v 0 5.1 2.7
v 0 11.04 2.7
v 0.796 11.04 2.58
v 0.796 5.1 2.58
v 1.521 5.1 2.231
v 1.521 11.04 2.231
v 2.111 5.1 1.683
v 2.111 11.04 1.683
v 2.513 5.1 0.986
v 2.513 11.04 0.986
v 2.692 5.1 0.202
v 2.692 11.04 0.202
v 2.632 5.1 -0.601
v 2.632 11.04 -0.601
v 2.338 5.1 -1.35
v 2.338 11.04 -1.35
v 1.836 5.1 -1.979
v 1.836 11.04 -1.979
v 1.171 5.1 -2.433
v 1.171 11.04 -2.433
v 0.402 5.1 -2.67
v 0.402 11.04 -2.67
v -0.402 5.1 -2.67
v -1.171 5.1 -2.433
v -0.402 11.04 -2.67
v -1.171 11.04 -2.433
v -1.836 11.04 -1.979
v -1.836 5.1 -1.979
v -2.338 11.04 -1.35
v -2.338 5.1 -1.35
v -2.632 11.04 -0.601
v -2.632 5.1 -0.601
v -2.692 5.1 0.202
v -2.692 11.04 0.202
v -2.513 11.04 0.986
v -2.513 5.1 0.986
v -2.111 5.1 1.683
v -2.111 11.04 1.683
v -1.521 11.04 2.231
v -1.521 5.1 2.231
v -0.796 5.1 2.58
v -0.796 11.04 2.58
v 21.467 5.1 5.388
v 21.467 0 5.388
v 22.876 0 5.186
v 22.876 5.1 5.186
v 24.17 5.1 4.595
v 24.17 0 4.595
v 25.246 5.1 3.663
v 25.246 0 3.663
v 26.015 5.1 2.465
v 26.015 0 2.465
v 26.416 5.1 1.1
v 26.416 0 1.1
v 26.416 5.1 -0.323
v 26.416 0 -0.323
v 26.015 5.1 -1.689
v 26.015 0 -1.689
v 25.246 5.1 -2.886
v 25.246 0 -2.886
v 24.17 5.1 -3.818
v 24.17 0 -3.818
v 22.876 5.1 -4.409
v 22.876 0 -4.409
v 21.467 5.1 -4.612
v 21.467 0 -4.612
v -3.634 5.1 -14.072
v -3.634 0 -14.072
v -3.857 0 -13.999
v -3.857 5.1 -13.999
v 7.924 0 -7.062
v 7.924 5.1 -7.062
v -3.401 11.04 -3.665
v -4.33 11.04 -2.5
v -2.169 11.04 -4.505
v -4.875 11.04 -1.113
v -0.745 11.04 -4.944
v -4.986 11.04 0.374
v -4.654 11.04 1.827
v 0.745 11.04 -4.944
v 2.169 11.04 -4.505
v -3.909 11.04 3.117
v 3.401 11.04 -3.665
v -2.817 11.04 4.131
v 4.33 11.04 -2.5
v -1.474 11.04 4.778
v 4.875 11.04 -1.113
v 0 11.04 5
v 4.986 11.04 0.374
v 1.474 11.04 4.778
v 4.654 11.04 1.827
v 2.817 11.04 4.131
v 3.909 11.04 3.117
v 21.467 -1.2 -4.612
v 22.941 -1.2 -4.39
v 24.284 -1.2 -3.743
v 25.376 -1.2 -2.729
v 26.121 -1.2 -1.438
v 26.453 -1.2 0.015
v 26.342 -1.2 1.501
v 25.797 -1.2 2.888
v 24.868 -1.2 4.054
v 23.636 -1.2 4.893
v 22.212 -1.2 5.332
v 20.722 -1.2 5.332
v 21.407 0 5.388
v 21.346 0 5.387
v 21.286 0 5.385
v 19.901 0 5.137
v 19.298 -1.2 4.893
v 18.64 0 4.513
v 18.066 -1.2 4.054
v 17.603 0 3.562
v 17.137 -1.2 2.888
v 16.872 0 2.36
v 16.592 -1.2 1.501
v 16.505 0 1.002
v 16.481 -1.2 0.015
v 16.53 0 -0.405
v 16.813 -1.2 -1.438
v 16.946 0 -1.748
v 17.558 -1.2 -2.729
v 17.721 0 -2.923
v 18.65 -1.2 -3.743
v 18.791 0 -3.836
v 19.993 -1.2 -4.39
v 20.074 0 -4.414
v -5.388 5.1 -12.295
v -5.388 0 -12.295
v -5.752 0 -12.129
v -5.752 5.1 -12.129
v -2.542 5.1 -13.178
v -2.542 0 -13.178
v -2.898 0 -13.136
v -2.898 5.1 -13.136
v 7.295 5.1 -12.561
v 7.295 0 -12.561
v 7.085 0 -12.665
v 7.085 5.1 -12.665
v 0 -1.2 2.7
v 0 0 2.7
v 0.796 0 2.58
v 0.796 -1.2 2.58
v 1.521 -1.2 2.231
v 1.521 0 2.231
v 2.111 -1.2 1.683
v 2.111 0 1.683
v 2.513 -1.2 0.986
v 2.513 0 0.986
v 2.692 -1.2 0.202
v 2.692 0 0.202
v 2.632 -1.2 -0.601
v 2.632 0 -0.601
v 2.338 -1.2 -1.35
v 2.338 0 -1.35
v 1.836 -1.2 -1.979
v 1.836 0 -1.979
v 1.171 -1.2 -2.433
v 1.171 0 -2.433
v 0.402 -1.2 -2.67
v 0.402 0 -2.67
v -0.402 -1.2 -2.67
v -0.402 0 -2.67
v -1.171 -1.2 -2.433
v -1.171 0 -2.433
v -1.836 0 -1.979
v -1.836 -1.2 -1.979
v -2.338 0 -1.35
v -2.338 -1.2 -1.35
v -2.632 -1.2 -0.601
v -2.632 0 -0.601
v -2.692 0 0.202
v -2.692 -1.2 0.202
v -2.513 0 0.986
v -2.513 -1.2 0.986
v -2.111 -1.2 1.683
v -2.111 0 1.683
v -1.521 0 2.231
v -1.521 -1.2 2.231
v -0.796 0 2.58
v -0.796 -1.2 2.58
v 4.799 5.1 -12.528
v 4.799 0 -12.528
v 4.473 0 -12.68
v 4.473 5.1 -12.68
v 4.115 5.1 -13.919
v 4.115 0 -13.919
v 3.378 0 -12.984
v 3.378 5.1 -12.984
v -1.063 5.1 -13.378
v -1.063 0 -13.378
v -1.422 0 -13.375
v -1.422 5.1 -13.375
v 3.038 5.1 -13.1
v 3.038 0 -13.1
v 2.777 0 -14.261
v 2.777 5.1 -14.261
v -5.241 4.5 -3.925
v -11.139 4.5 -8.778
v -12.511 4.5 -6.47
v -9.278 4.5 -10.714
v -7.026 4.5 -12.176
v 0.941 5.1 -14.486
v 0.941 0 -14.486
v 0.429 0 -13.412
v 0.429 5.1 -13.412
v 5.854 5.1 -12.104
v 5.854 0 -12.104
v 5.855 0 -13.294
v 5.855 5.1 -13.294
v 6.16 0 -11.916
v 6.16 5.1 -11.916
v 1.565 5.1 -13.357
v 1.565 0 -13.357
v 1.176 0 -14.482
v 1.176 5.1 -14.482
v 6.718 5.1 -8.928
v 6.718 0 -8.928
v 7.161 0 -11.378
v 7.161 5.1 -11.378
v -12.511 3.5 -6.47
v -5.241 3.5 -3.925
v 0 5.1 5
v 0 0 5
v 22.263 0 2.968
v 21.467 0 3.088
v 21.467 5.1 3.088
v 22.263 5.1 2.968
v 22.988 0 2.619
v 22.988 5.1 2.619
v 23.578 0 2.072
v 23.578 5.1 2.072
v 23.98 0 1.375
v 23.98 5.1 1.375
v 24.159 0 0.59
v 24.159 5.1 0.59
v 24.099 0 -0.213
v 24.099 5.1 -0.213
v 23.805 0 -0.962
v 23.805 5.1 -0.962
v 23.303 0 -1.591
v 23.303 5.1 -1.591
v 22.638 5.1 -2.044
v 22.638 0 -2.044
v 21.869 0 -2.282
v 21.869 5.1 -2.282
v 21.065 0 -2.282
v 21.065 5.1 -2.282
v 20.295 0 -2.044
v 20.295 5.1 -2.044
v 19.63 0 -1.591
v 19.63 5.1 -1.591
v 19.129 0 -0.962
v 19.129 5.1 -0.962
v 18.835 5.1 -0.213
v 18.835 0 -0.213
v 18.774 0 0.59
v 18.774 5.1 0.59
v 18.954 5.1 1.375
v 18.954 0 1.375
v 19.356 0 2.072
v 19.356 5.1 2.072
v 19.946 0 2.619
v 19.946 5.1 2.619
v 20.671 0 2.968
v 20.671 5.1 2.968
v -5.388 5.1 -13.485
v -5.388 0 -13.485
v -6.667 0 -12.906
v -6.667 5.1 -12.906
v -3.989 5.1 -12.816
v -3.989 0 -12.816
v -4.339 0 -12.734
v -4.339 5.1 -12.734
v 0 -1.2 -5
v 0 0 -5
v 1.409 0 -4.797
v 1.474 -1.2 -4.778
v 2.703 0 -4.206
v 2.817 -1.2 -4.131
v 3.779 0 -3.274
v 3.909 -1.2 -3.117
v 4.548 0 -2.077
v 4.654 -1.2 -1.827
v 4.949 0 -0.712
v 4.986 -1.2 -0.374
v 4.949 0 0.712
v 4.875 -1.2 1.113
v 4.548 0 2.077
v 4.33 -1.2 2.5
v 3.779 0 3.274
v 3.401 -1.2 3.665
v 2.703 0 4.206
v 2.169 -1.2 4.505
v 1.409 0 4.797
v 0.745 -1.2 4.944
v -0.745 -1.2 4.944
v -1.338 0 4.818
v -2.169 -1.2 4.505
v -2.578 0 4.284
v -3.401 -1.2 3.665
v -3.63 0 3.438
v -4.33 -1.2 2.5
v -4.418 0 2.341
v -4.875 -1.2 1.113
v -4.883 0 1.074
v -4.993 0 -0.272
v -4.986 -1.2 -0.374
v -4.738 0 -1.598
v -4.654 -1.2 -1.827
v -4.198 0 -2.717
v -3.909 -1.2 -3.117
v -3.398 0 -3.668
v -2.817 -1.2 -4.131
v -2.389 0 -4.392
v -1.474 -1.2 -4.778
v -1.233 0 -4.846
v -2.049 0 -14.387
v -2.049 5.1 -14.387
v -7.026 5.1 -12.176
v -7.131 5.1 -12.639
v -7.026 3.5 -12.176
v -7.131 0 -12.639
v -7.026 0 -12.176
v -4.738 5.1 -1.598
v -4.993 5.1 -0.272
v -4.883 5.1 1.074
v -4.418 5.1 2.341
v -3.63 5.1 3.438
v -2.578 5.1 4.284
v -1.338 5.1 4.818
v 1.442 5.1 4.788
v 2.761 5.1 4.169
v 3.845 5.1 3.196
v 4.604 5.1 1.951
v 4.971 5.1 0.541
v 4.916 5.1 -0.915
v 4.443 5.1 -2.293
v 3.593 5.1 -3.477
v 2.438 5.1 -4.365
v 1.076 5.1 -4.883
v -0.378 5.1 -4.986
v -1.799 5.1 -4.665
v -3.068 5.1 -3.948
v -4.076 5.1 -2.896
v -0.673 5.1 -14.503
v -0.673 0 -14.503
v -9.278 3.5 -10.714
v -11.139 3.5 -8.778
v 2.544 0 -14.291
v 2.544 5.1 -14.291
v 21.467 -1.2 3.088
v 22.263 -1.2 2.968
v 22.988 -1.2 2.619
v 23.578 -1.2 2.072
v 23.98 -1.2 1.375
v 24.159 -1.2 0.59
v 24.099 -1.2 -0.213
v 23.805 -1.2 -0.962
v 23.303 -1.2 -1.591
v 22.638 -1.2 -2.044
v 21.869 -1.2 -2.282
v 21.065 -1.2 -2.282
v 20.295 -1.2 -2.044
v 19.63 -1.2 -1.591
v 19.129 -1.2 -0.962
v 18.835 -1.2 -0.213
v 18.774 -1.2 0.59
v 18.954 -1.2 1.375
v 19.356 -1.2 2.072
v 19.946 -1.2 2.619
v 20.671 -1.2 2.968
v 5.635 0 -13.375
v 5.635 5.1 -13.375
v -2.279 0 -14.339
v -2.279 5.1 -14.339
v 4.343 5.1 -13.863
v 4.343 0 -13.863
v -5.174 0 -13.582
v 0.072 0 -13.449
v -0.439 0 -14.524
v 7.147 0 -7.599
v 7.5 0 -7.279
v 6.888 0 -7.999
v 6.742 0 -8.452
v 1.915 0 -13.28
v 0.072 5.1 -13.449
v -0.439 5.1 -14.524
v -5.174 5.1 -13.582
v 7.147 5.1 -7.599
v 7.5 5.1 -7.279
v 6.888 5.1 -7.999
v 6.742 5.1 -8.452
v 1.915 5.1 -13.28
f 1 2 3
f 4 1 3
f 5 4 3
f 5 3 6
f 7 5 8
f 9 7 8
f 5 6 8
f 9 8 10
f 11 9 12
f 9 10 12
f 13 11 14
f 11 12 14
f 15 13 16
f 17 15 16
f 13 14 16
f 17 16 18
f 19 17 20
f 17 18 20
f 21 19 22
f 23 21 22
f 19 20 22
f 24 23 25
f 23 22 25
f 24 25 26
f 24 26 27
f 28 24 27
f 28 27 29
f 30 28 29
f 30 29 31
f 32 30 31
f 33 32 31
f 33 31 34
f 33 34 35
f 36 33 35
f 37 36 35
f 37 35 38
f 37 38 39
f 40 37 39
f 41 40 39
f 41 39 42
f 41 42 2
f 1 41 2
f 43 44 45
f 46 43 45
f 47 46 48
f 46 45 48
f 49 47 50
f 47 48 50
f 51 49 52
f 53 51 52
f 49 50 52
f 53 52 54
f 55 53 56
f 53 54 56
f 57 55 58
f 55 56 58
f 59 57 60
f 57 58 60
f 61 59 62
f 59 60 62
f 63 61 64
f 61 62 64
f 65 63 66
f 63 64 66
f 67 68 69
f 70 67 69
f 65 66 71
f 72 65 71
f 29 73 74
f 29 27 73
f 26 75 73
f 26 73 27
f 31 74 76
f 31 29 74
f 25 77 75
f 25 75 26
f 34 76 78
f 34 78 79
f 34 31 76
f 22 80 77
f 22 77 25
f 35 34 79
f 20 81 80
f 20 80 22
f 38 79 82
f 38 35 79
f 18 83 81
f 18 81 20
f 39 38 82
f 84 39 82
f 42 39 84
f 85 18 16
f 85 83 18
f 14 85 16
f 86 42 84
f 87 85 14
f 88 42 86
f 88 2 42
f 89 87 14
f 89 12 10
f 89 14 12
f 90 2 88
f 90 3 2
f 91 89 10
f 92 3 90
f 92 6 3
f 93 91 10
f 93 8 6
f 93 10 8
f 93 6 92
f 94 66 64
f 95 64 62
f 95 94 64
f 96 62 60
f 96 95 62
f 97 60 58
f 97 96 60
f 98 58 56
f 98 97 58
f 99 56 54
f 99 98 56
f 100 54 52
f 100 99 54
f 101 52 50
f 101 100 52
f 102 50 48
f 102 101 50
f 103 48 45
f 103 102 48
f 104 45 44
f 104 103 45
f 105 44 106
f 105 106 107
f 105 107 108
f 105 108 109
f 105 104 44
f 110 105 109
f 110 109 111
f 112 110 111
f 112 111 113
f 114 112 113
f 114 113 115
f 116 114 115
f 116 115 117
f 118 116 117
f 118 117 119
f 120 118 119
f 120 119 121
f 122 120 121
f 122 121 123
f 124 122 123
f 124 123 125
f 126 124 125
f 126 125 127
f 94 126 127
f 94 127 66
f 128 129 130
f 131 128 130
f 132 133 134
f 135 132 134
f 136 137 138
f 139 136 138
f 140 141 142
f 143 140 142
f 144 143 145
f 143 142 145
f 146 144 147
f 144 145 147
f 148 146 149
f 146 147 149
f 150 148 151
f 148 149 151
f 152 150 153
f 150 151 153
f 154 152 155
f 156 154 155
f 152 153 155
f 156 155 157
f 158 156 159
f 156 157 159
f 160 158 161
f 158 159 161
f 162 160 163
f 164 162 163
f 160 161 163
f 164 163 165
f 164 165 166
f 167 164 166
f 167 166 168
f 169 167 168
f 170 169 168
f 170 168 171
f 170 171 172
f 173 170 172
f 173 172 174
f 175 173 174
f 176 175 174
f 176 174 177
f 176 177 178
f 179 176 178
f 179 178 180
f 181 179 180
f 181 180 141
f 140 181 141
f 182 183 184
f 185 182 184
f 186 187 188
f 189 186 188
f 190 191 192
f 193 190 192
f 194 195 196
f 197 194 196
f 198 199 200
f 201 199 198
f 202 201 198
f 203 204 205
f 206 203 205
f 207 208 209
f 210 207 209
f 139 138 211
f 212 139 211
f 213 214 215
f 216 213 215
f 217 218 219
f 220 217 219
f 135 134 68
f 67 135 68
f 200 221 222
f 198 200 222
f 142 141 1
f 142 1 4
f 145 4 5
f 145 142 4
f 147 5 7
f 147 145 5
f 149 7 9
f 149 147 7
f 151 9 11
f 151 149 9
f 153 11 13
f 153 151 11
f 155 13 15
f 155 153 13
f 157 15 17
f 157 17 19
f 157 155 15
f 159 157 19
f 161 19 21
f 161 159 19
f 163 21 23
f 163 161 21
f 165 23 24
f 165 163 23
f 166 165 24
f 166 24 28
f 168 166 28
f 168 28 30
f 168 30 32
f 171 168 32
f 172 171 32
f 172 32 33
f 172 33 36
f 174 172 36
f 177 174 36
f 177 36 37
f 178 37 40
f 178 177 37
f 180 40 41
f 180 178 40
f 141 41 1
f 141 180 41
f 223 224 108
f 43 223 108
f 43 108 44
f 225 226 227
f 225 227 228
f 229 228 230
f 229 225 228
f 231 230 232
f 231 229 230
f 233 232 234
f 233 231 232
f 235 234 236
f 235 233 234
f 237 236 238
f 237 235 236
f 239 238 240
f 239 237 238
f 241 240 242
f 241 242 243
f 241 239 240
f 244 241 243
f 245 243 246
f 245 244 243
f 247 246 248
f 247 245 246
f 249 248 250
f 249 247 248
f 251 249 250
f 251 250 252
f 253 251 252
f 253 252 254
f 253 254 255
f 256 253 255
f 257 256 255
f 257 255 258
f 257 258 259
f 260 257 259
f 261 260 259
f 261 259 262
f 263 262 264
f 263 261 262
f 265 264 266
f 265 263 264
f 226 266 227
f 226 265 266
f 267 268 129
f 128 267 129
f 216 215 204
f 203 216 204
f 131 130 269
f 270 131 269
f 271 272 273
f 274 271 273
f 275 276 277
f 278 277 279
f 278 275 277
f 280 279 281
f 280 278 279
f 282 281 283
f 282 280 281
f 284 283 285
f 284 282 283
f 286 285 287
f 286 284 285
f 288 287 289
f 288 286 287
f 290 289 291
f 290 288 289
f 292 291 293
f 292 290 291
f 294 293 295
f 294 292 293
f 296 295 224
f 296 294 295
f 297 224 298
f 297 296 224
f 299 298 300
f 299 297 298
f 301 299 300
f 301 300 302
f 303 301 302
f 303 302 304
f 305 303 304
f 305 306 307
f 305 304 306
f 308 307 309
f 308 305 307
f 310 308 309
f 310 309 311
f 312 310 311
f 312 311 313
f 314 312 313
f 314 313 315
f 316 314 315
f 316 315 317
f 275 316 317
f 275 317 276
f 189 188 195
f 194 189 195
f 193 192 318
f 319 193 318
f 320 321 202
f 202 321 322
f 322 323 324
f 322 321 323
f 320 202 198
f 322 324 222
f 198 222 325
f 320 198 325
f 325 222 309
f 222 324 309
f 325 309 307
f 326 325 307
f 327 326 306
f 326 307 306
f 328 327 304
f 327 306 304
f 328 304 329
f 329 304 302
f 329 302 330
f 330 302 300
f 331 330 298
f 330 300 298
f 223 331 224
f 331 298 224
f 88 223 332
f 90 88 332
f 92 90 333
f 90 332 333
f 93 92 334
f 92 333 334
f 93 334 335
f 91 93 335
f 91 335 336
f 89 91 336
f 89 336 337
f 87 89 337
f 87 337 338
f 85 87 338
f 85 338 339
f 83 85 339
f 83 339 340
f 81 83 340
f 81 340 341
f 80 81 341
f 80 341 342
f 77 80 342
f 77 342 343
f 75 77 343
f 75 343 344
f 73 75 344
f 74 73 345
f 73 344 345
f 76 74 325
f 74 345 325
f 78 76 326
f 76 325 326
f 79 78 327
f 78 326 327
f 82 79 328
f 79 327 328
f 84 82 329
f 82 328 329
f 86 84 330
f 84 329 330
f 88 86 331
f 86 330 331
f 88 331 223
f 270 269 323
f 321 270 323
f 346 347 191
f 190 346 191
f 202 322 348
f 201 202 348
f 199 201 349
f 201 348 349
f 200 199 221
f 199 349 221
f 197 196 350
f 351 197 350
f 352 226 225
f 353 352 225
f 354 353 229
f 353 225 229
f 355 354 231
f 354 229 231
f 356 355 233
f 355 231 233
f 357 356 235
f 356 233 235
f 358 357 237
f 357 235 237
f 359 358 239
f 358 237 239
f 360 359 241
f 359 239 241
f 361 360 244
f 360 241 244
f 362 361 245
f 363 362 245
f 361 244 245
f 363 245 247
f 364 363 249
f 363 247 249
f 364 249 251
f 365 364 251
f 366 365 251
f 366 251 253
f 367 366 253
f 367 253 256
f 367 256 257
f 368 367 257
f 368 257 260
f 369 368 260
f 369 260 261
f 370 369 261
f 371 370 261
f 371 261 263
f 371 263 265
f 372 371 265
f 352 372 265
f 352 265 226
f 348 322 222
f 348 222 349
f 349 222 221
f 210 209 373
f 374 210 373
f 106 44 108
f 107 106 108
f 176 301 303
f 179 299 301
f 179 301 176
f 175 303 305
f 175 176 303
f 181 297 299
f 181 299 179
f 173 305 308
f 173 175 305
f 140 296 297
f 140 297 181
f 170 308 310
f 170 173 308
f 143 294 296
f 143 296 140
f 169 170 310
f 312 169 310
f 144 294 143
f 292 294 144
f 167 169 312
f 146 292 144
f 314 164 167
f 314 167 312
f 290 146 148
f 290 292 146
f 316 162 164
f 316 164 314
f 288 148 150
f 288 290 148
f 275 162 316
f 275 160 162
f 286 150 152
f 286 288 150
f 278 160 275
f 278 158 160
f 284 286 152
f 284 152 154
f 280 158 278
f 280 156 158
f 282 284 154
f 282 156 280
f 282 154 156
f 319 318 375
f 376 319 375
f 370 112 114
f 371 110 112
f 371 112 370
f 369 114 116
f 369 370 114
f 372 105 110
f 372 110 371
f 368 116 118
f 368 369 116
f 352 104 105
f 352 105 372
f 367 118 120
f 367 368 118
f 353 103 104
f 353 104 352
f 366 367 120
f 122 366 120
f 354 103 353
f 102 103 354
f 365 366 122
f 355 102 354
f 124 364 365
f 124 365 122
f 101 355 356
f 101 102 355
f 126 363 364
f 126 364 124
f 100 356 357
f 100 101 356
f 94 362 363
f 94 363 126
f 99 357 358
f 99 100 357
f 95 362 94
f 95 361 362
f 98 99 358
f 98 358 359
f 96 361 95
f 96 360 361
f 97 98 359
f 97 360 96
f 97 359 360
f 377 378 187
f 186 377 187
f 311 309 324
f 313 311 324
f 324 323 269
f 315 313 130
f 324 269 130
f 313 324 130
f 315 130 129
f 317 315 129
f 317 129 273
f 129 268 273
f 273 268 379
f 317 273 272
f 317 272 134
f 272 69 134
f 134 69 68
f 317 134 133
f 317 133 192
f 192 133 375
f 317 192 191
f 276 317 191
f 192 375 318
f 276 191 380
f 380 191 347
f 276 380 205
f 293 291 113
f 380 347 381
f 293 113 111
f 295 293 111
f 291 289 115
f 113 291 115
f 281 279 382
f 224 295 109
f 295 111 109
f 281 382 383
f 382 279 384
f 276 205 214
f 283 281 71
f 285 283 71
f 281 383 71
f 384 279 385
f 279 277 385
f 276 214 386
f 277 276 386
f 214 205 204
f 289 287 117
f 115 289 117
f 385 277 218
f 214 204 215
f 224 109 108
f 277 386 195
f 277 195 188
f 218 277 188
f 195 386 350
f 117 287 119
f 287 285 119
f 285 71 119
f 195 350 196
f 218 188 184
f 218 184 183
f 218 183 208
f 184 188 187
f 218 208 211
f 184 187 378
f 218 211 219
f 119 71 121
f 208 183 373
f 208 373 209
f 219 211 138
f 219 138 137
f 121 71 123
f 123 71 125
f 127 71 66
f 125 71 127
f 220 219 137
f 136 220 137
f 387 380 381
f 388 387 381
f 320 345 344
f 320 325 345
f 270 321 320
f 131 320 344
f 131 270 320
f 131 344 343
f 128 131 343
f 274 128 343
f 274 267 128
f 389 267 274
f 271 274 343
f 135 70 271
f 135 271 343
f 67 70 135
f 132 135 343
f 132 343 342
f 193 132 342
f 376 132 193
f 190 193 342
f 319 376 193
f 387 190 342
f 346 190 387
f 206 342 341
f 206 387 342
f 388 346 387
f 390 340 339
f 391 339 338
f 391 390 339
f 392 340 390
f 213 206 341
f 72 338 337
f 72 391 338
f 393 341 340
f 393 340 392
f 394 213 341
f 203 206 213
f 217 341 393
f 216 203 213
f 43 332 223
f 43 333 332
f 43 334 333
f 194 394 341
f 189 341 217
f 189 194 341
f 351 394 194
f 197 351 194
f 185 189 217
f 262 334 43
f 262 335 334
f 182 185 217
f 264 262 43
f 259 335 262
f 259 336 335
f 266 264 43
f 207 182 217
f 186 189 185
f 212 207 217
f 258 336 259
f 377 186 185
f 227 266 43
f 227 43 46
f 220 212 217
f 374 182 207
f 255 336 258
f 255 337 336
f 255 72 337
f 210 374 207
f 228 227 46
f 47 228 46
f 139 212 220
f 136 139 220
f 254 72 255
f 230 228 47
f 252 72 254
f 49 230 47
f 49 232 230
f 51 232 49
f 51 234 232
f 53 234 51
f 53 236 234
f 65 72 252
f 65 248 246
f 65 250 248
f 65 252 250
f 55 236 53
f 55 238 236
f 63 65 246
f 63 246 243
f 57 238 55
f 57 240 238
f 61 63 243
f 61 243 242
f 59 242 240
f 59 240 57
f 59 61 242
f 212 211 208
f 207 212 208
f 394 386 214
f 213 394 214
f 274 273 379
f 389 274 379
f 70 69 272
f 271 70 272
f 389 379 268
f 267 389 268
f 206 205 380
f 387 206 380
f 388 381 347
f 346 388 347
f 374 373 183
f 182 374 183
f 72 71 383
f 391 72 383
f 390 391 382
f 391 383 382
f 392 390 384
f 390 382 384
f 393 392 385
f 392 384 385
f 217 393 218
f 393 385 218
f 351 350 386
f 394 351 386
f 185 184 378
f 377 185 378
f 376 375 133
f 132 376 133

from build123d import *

# Parameters (mm, degrees)
SKETCH_1_R          = 2.7000000000000006
SKETCH_1_R_2        = 2.700000000000003
EXTRUDE_1_DEPTH     = 5.1
SKETCH_2_R          = 4.999999999999998
SKETCH_2_R_2        = 2.5
EXTRUDE_2_DEPTH     = 5.94
CUT_EXTRUDE_1_DEPTH = 3.5
CUT_EXTRUDE_START   = -0.6
CUT_EXTRUDE_3_DEPTH = 0.6
EXTRUDE_START       = 1.2
SKETCH_6_R          = 4.999999999999998
SKETCH_6_R_2        = 2.5
SKETCH_6_R_3        = 5
SKETCH_6_R_4        = 2.4999999999999987
EXTRUDE_4_DEPTH     = 1.2
SKETCH_7_R          = 2.6000000000000005
CUT_EXTRUDE_4_DEPTH = 33.57721194023454
SKETCH_8_R          = 2.6
CUT_EXTRUDE_5_DEPTH = 31.8406734329677
SKETCH_10_R         = 2.7
CUT_EXTRUDE_6_DEPTH = 33.57721194023454
SKETCH_11_R         = 2.700000000000001
CUT_EXTRUDE_7_DEPTH = 31.8406734329677


with BuildPart() as part:
    # Эскиз1 → Бобышка-Вытянуть1 (new body)
    with BuildSketch(Plane(origin=(0, 0, 0), x_dir=(1, 0, 0), z_dir=(0, 1, 0))):
        with BuildLine():
            Line((6.718023264525762, 8.928267668376021), (7.161238337218641, 11.37785065819786))
            Line((7.161238337218641, 11.37785065819786), (7.294846288705666, 12.560700282216452))
            Line((7.294846288705666, 12.560700282216452), (7.085001061393901, 12.665407082864023))
            Line((7.085001061393901, 12.665407082864023), (6.15987792536569, 11.916319971156167))
            Line((6.15987792536569, 11.916319971156167), (5.853623131200735, 12.10383694173367))
            Line((5.853623131200735, 12.10383694173367), (5.855060736117009, 13.29420757772634))
            Line((5.855060736117009, 13.29420757772634), (5.634886528714601, 13.37496556136943))
            Line((5.634886528714601, 13.37496556136943), (4.798663389284832, 12.527784837542624))
            Line((4.798663389284832, 12.527784837542624), (4.473480547373511, 12.680135526842204))
            Line((4.473480547373511, 12.680135526842204), (4.342730025112913, 13.863304415323501))
            Line((4.342730025112913, 13.863304415323501), (4.114949999467502, 13.919114749889351))
            Line((4.114949999467502, 13.919114749889351), (3.3779694438823102, 12.984318526945106))
            Line((3.3779694438823102, 12.984318526945106), (3.0378804853992434, 13.099618628946285))
            Line((3.0378804853992434, 13.099618628946285), (2.776558986480811, 14.260952083189514))
            Line((2.776558986480811, 14.260952083189514), (2.54399037483231, 14.291124494483034))
            Line((2.54399037483231, 14.291124494483034), (1.9153675367628848, 13.280274532718662))
            Line((1.9153675367628848, 13.280274532718662), (1.56457875493138, 13.35709799101592))
            Line((1.56457875493138, 13.35709799101592), (1.175918359734634, 14.482232389631033))
            Line((1.175918359734634, 14.482232389631033), (0.9414376205823001, 14.486393698794194))
            Line((0.9414376205823001, 14.486393698794194), (0.4289474421954887, 13.411992407470256))
            Line((0.42894744219548875, 13.411992407470256), (0.07179746795026506, 13.449389053044667))
            Line((0.07179746795026506, 13.449389053044667), (-0.4393947883485354, 14.524408492330128))
            Line((-0.43939478834853546, 14.524408492330128), (-0.6728875469021285, 14.502507231398162))
            Line((-0.6728875469021285, 14.502507231398162), (-1.062906477097084, 13.377843036257644))
            Line((-1.062906477097084, 13.377843036257644), (-1.4220003362283888, 13.375350339371238))
            Line((-1.4220003362283888, 13.375350339371238), (-2.049401918098927, 14.386958748197415))
            Line((-2.049401918098927, 14.386958748197415), (-2.279018807507275, 14.33926579666565))
            Line((-2.279018807507275, 14.33926579666565), (-2.5417426516817105, 13.178248785832608))
            Line((-2.5417426516817105, 13.178248785832608), (-2.898339045786024, 13.13589757669542))
            Line((-2.898339045786024, 13.13589757669542), (-3.6341901158202092, 14.071583165165732))
            Line((-3.6341901158202092, 14.071583165165732), (-3.8570911851181764, 13.998688399693854))
            Line((-3.8570911851181764, 13.998688399693854), (-3.989270518385492, 12.815678280718325))
            Line((-3.989270518385492, 12.815678280718325), (-4.3389589867331635, 12.733992368173748))
            Line((-4.3389589867331635, 12.733992368173748), (-5.174158380979493, 13.582182376127184))
            Line((-5.174158380979493, 13.582182376127184), (-5.3875867419063175, 13.48498737481814))
            Line((-5.3875867419063175, 13.48498737481814), (-5.3875867419063175, 12.2946158707315))
            Line((-5.3875867419063175, 12.2946158707315), (-5.751610974482103, 12.12883970299033))
            Line((-5.751610974482103, 12.12883970299033), (-6.666748566138722, 12.905854249247858))
            Line((-6.666748566138722, 12.905854249247858), (-7.13096440438616, 12.63943472468846))
            Line((-7.13096440438616, 12.63943472468846), (-7.025830916712447, 12.175864106991055))
            ThreePointArc((-7.025830916712449, 12.175864106991055), (-10.264322646127633, 9.799709596012173), (-12.51111253150909, 6.470163958468902))
            Line((-12.51111253150909, 6.470163958468902), (-5.241071220187256, 3.924995297345621))
            Line((-5.241071220187256, 3.924995297345621), (-4.737733567637334, 1.5980865565051285))
            ThreePointArc((-4.737733567637334, 1.5980865565051288), (-4.061430338102922, -2.9162962141622684), (1.55e-15, -5))
            Line((2.2e-16, -5), (21.46693589645179, -5.388260461869603))
            ThreePointArc((21.46693589645179, -5.388260461869605), (26.46693589645179, -0.3882604618696045), (21.46693589645179, 4.611739538130397))
            Line((21.46693589645179, 4.611739538130397), (7.924308406385933, 7.062073595968816))
            ThreePointArc((7.924308406385932, 7.062073595968816), (7.00463576208043, 7.790569444059032), (6.718023264525762, 8.928267668376021))
        make_face()
        with Locations(Location((21.46693589645179, -0.3882604618696027, 0), (0, 0, 270))):
            Circle(SKETCH_1_R, mode=Mode.SUBTRACT)
        with Locations(Location((-2.22e-15, -1.39e-15, 0), (0, 0, 270))):
            Circle(SKETCH_1_R_2, mode=Mode.SUBTRACT)
    extrude(amount=EXTRUDE_1_DEPTH)

    # Эскиз2 → Бобышка-Вытянуть2 (add)
    with BuildSketch(Plane(origin=(0, 5.1, 0), x_dir=(1, 0, 0), z_dir=(0, 1, 0))):
        with Locations(Location((0, 0, 0), (0, 0, 270))):
            Circle(SKETCH_2_R)
        with Locations(Location((0, 0, 0), (0, 0, 270))):
            Circle(SKETCH_2_R_2, mode=Mode.SUBTRACT)
    extrude(amount=EXTRUDE_2_DEPTH)

    # Эскиз4 → Вырез-Вытянуть1 (cut)
    with BuildSketch(Plane.XZ):
        with BuildLine():
            Line((-5.241071220187255, -3.924995297345621), (-7.025830916712447, -12.175864106991055))
            ThreePointArc((-7.025830916712447, -12.175864106991055), (-10.264322646127628, -9.799709596012166), (-12.511112531509088, -6.470163958468901))
            Line((-12.511112531509088, -6.470163958468901), (-5.241071220187255, -3.924995297345621))
        make_face()
    extrude(amount=-CUT_EXTRUDE_1_DEPTH, mode=Mode.SUBTRACT)

    # Эскиз5 → Вырез-Вытянуть3 (cut)
    with BuildSketch(Plane(origin=(0, 5.1, 0), x_dir=(1, 0, 0), z_dir=(0, 1, 0)).offset(CUT_EXTRUDE_START)):
        with BuildLine():
            Line((-5.241071220187255, 3.924995297345621), (-7.025830916712447, 12.175864106991055))
            ThreePointArc((-7.025830916712447, 12.175864106991055), (-10.264322646127628, 9.799709596012168), (-12.511112531509088, 6.470163958468901))
            Line((-12.511112531509088, 6.470163958468901), (-5.241071220187255, 3.924995297345621))
        make_face()
    extrude(amount=CUT_EXTRUDE_3_DEPTH, mode=Mode.SUBTRACT)

    # Эскиз6 → Бобышка-Вытянуть4 (add)
    # profile 1 of 2: a face of its own
    with BuildSketch(Plane.XZ.offset(EXTRUDE_START)):
        with Locations(Location((0, 0, 0), (0, 0, 270))):
            Circle(SKETCH_6_R)
        with Locations(Location((0, 0, 0), (0, 0, 90))):
            Circle(SKETCH_6_R_2, mode=Mode.SUBTRACT)
    # profile 2 of 2: a face of its own
    with BuildSketch(Plane.XZ.offset(EXTRUDE_START)):
        with Locations(Location((21.46693589645179, 0.38826046186960295, 0), (0, 0, 270))):
            Circle(SKETCH_6_R_3)
        with Locations(Location((21.46693589645179, 0.38826046186960295, 0), (0, 0, 270))):
            Circle(SKETCH_6_R_4, mode=Mode.SUBTRACT)
    extrude(amount=-EXTRUDE_4_DEPTH)

    # Эскиз7 → Вырез-Вытянуть4 (cut, through all)
    with BuildSketch(Plane(origin=(0, 11.04, 0), x_dir=(1, 0, 0), z_dir=(0, 1, 0))):
        with Locations(Location((0, 0, 0), (0, 0, 270))):
            Circle(SKETCH_7_R)
    extrude(amount=-CUT_EXTRUDE_4_DEPTH, mode=Mode.SUBTRACT)

    # Эскиз8 → Вырез-Вытянуть5 (cut, through all)
    with BuildSketch(Plane(origin=(0, 5.1, 0), x_dir=(1, 0, 0), z_dir=(0, 1, 0))):
        with Locations(Location((21.46693589645179, -0.38826046186960295, 0), (0, 0, 270))):
            Circle(SKETCH_8_R)
    extrude(amount=-CUT_EXTRUDE_5_DEPTH, mode=Mode.SUBTRACT)

    # Эскиз10 → Вырез-Вытянуть6 (cut, through all)
    with BuildSketch(Plane(origin=(0, 11.04, 0), x_dir=(1, 0, 0), z_dir=(0, 1, 0))):
        with Locations(Location((0, 0, 0), (0, 0, 270))):
            Circle(SKETCH_10_R)
    extrude(amount=-CUT_EXTRUDE_6_DEPTH, mode=Mode.SUBTRACT)

    # Эскиз11 → Вырез-Вытянуть7 (cut, through all)
    with BuildSketch(Plane(origin=(0, 5.1, 0), x_dir=(1, 0, 0), z_dir=(0, 1, 0))):
        with Locations(Location((21.46693589645179, -0.38826046186960295, 0), (0, 0, 270))):
            Circle(SKETCH_11_R)
    extrude(amount=-CUT_EXTRUDE_7_DEPTH, mode=Mode.SUBTRACT)


solid = part.part
